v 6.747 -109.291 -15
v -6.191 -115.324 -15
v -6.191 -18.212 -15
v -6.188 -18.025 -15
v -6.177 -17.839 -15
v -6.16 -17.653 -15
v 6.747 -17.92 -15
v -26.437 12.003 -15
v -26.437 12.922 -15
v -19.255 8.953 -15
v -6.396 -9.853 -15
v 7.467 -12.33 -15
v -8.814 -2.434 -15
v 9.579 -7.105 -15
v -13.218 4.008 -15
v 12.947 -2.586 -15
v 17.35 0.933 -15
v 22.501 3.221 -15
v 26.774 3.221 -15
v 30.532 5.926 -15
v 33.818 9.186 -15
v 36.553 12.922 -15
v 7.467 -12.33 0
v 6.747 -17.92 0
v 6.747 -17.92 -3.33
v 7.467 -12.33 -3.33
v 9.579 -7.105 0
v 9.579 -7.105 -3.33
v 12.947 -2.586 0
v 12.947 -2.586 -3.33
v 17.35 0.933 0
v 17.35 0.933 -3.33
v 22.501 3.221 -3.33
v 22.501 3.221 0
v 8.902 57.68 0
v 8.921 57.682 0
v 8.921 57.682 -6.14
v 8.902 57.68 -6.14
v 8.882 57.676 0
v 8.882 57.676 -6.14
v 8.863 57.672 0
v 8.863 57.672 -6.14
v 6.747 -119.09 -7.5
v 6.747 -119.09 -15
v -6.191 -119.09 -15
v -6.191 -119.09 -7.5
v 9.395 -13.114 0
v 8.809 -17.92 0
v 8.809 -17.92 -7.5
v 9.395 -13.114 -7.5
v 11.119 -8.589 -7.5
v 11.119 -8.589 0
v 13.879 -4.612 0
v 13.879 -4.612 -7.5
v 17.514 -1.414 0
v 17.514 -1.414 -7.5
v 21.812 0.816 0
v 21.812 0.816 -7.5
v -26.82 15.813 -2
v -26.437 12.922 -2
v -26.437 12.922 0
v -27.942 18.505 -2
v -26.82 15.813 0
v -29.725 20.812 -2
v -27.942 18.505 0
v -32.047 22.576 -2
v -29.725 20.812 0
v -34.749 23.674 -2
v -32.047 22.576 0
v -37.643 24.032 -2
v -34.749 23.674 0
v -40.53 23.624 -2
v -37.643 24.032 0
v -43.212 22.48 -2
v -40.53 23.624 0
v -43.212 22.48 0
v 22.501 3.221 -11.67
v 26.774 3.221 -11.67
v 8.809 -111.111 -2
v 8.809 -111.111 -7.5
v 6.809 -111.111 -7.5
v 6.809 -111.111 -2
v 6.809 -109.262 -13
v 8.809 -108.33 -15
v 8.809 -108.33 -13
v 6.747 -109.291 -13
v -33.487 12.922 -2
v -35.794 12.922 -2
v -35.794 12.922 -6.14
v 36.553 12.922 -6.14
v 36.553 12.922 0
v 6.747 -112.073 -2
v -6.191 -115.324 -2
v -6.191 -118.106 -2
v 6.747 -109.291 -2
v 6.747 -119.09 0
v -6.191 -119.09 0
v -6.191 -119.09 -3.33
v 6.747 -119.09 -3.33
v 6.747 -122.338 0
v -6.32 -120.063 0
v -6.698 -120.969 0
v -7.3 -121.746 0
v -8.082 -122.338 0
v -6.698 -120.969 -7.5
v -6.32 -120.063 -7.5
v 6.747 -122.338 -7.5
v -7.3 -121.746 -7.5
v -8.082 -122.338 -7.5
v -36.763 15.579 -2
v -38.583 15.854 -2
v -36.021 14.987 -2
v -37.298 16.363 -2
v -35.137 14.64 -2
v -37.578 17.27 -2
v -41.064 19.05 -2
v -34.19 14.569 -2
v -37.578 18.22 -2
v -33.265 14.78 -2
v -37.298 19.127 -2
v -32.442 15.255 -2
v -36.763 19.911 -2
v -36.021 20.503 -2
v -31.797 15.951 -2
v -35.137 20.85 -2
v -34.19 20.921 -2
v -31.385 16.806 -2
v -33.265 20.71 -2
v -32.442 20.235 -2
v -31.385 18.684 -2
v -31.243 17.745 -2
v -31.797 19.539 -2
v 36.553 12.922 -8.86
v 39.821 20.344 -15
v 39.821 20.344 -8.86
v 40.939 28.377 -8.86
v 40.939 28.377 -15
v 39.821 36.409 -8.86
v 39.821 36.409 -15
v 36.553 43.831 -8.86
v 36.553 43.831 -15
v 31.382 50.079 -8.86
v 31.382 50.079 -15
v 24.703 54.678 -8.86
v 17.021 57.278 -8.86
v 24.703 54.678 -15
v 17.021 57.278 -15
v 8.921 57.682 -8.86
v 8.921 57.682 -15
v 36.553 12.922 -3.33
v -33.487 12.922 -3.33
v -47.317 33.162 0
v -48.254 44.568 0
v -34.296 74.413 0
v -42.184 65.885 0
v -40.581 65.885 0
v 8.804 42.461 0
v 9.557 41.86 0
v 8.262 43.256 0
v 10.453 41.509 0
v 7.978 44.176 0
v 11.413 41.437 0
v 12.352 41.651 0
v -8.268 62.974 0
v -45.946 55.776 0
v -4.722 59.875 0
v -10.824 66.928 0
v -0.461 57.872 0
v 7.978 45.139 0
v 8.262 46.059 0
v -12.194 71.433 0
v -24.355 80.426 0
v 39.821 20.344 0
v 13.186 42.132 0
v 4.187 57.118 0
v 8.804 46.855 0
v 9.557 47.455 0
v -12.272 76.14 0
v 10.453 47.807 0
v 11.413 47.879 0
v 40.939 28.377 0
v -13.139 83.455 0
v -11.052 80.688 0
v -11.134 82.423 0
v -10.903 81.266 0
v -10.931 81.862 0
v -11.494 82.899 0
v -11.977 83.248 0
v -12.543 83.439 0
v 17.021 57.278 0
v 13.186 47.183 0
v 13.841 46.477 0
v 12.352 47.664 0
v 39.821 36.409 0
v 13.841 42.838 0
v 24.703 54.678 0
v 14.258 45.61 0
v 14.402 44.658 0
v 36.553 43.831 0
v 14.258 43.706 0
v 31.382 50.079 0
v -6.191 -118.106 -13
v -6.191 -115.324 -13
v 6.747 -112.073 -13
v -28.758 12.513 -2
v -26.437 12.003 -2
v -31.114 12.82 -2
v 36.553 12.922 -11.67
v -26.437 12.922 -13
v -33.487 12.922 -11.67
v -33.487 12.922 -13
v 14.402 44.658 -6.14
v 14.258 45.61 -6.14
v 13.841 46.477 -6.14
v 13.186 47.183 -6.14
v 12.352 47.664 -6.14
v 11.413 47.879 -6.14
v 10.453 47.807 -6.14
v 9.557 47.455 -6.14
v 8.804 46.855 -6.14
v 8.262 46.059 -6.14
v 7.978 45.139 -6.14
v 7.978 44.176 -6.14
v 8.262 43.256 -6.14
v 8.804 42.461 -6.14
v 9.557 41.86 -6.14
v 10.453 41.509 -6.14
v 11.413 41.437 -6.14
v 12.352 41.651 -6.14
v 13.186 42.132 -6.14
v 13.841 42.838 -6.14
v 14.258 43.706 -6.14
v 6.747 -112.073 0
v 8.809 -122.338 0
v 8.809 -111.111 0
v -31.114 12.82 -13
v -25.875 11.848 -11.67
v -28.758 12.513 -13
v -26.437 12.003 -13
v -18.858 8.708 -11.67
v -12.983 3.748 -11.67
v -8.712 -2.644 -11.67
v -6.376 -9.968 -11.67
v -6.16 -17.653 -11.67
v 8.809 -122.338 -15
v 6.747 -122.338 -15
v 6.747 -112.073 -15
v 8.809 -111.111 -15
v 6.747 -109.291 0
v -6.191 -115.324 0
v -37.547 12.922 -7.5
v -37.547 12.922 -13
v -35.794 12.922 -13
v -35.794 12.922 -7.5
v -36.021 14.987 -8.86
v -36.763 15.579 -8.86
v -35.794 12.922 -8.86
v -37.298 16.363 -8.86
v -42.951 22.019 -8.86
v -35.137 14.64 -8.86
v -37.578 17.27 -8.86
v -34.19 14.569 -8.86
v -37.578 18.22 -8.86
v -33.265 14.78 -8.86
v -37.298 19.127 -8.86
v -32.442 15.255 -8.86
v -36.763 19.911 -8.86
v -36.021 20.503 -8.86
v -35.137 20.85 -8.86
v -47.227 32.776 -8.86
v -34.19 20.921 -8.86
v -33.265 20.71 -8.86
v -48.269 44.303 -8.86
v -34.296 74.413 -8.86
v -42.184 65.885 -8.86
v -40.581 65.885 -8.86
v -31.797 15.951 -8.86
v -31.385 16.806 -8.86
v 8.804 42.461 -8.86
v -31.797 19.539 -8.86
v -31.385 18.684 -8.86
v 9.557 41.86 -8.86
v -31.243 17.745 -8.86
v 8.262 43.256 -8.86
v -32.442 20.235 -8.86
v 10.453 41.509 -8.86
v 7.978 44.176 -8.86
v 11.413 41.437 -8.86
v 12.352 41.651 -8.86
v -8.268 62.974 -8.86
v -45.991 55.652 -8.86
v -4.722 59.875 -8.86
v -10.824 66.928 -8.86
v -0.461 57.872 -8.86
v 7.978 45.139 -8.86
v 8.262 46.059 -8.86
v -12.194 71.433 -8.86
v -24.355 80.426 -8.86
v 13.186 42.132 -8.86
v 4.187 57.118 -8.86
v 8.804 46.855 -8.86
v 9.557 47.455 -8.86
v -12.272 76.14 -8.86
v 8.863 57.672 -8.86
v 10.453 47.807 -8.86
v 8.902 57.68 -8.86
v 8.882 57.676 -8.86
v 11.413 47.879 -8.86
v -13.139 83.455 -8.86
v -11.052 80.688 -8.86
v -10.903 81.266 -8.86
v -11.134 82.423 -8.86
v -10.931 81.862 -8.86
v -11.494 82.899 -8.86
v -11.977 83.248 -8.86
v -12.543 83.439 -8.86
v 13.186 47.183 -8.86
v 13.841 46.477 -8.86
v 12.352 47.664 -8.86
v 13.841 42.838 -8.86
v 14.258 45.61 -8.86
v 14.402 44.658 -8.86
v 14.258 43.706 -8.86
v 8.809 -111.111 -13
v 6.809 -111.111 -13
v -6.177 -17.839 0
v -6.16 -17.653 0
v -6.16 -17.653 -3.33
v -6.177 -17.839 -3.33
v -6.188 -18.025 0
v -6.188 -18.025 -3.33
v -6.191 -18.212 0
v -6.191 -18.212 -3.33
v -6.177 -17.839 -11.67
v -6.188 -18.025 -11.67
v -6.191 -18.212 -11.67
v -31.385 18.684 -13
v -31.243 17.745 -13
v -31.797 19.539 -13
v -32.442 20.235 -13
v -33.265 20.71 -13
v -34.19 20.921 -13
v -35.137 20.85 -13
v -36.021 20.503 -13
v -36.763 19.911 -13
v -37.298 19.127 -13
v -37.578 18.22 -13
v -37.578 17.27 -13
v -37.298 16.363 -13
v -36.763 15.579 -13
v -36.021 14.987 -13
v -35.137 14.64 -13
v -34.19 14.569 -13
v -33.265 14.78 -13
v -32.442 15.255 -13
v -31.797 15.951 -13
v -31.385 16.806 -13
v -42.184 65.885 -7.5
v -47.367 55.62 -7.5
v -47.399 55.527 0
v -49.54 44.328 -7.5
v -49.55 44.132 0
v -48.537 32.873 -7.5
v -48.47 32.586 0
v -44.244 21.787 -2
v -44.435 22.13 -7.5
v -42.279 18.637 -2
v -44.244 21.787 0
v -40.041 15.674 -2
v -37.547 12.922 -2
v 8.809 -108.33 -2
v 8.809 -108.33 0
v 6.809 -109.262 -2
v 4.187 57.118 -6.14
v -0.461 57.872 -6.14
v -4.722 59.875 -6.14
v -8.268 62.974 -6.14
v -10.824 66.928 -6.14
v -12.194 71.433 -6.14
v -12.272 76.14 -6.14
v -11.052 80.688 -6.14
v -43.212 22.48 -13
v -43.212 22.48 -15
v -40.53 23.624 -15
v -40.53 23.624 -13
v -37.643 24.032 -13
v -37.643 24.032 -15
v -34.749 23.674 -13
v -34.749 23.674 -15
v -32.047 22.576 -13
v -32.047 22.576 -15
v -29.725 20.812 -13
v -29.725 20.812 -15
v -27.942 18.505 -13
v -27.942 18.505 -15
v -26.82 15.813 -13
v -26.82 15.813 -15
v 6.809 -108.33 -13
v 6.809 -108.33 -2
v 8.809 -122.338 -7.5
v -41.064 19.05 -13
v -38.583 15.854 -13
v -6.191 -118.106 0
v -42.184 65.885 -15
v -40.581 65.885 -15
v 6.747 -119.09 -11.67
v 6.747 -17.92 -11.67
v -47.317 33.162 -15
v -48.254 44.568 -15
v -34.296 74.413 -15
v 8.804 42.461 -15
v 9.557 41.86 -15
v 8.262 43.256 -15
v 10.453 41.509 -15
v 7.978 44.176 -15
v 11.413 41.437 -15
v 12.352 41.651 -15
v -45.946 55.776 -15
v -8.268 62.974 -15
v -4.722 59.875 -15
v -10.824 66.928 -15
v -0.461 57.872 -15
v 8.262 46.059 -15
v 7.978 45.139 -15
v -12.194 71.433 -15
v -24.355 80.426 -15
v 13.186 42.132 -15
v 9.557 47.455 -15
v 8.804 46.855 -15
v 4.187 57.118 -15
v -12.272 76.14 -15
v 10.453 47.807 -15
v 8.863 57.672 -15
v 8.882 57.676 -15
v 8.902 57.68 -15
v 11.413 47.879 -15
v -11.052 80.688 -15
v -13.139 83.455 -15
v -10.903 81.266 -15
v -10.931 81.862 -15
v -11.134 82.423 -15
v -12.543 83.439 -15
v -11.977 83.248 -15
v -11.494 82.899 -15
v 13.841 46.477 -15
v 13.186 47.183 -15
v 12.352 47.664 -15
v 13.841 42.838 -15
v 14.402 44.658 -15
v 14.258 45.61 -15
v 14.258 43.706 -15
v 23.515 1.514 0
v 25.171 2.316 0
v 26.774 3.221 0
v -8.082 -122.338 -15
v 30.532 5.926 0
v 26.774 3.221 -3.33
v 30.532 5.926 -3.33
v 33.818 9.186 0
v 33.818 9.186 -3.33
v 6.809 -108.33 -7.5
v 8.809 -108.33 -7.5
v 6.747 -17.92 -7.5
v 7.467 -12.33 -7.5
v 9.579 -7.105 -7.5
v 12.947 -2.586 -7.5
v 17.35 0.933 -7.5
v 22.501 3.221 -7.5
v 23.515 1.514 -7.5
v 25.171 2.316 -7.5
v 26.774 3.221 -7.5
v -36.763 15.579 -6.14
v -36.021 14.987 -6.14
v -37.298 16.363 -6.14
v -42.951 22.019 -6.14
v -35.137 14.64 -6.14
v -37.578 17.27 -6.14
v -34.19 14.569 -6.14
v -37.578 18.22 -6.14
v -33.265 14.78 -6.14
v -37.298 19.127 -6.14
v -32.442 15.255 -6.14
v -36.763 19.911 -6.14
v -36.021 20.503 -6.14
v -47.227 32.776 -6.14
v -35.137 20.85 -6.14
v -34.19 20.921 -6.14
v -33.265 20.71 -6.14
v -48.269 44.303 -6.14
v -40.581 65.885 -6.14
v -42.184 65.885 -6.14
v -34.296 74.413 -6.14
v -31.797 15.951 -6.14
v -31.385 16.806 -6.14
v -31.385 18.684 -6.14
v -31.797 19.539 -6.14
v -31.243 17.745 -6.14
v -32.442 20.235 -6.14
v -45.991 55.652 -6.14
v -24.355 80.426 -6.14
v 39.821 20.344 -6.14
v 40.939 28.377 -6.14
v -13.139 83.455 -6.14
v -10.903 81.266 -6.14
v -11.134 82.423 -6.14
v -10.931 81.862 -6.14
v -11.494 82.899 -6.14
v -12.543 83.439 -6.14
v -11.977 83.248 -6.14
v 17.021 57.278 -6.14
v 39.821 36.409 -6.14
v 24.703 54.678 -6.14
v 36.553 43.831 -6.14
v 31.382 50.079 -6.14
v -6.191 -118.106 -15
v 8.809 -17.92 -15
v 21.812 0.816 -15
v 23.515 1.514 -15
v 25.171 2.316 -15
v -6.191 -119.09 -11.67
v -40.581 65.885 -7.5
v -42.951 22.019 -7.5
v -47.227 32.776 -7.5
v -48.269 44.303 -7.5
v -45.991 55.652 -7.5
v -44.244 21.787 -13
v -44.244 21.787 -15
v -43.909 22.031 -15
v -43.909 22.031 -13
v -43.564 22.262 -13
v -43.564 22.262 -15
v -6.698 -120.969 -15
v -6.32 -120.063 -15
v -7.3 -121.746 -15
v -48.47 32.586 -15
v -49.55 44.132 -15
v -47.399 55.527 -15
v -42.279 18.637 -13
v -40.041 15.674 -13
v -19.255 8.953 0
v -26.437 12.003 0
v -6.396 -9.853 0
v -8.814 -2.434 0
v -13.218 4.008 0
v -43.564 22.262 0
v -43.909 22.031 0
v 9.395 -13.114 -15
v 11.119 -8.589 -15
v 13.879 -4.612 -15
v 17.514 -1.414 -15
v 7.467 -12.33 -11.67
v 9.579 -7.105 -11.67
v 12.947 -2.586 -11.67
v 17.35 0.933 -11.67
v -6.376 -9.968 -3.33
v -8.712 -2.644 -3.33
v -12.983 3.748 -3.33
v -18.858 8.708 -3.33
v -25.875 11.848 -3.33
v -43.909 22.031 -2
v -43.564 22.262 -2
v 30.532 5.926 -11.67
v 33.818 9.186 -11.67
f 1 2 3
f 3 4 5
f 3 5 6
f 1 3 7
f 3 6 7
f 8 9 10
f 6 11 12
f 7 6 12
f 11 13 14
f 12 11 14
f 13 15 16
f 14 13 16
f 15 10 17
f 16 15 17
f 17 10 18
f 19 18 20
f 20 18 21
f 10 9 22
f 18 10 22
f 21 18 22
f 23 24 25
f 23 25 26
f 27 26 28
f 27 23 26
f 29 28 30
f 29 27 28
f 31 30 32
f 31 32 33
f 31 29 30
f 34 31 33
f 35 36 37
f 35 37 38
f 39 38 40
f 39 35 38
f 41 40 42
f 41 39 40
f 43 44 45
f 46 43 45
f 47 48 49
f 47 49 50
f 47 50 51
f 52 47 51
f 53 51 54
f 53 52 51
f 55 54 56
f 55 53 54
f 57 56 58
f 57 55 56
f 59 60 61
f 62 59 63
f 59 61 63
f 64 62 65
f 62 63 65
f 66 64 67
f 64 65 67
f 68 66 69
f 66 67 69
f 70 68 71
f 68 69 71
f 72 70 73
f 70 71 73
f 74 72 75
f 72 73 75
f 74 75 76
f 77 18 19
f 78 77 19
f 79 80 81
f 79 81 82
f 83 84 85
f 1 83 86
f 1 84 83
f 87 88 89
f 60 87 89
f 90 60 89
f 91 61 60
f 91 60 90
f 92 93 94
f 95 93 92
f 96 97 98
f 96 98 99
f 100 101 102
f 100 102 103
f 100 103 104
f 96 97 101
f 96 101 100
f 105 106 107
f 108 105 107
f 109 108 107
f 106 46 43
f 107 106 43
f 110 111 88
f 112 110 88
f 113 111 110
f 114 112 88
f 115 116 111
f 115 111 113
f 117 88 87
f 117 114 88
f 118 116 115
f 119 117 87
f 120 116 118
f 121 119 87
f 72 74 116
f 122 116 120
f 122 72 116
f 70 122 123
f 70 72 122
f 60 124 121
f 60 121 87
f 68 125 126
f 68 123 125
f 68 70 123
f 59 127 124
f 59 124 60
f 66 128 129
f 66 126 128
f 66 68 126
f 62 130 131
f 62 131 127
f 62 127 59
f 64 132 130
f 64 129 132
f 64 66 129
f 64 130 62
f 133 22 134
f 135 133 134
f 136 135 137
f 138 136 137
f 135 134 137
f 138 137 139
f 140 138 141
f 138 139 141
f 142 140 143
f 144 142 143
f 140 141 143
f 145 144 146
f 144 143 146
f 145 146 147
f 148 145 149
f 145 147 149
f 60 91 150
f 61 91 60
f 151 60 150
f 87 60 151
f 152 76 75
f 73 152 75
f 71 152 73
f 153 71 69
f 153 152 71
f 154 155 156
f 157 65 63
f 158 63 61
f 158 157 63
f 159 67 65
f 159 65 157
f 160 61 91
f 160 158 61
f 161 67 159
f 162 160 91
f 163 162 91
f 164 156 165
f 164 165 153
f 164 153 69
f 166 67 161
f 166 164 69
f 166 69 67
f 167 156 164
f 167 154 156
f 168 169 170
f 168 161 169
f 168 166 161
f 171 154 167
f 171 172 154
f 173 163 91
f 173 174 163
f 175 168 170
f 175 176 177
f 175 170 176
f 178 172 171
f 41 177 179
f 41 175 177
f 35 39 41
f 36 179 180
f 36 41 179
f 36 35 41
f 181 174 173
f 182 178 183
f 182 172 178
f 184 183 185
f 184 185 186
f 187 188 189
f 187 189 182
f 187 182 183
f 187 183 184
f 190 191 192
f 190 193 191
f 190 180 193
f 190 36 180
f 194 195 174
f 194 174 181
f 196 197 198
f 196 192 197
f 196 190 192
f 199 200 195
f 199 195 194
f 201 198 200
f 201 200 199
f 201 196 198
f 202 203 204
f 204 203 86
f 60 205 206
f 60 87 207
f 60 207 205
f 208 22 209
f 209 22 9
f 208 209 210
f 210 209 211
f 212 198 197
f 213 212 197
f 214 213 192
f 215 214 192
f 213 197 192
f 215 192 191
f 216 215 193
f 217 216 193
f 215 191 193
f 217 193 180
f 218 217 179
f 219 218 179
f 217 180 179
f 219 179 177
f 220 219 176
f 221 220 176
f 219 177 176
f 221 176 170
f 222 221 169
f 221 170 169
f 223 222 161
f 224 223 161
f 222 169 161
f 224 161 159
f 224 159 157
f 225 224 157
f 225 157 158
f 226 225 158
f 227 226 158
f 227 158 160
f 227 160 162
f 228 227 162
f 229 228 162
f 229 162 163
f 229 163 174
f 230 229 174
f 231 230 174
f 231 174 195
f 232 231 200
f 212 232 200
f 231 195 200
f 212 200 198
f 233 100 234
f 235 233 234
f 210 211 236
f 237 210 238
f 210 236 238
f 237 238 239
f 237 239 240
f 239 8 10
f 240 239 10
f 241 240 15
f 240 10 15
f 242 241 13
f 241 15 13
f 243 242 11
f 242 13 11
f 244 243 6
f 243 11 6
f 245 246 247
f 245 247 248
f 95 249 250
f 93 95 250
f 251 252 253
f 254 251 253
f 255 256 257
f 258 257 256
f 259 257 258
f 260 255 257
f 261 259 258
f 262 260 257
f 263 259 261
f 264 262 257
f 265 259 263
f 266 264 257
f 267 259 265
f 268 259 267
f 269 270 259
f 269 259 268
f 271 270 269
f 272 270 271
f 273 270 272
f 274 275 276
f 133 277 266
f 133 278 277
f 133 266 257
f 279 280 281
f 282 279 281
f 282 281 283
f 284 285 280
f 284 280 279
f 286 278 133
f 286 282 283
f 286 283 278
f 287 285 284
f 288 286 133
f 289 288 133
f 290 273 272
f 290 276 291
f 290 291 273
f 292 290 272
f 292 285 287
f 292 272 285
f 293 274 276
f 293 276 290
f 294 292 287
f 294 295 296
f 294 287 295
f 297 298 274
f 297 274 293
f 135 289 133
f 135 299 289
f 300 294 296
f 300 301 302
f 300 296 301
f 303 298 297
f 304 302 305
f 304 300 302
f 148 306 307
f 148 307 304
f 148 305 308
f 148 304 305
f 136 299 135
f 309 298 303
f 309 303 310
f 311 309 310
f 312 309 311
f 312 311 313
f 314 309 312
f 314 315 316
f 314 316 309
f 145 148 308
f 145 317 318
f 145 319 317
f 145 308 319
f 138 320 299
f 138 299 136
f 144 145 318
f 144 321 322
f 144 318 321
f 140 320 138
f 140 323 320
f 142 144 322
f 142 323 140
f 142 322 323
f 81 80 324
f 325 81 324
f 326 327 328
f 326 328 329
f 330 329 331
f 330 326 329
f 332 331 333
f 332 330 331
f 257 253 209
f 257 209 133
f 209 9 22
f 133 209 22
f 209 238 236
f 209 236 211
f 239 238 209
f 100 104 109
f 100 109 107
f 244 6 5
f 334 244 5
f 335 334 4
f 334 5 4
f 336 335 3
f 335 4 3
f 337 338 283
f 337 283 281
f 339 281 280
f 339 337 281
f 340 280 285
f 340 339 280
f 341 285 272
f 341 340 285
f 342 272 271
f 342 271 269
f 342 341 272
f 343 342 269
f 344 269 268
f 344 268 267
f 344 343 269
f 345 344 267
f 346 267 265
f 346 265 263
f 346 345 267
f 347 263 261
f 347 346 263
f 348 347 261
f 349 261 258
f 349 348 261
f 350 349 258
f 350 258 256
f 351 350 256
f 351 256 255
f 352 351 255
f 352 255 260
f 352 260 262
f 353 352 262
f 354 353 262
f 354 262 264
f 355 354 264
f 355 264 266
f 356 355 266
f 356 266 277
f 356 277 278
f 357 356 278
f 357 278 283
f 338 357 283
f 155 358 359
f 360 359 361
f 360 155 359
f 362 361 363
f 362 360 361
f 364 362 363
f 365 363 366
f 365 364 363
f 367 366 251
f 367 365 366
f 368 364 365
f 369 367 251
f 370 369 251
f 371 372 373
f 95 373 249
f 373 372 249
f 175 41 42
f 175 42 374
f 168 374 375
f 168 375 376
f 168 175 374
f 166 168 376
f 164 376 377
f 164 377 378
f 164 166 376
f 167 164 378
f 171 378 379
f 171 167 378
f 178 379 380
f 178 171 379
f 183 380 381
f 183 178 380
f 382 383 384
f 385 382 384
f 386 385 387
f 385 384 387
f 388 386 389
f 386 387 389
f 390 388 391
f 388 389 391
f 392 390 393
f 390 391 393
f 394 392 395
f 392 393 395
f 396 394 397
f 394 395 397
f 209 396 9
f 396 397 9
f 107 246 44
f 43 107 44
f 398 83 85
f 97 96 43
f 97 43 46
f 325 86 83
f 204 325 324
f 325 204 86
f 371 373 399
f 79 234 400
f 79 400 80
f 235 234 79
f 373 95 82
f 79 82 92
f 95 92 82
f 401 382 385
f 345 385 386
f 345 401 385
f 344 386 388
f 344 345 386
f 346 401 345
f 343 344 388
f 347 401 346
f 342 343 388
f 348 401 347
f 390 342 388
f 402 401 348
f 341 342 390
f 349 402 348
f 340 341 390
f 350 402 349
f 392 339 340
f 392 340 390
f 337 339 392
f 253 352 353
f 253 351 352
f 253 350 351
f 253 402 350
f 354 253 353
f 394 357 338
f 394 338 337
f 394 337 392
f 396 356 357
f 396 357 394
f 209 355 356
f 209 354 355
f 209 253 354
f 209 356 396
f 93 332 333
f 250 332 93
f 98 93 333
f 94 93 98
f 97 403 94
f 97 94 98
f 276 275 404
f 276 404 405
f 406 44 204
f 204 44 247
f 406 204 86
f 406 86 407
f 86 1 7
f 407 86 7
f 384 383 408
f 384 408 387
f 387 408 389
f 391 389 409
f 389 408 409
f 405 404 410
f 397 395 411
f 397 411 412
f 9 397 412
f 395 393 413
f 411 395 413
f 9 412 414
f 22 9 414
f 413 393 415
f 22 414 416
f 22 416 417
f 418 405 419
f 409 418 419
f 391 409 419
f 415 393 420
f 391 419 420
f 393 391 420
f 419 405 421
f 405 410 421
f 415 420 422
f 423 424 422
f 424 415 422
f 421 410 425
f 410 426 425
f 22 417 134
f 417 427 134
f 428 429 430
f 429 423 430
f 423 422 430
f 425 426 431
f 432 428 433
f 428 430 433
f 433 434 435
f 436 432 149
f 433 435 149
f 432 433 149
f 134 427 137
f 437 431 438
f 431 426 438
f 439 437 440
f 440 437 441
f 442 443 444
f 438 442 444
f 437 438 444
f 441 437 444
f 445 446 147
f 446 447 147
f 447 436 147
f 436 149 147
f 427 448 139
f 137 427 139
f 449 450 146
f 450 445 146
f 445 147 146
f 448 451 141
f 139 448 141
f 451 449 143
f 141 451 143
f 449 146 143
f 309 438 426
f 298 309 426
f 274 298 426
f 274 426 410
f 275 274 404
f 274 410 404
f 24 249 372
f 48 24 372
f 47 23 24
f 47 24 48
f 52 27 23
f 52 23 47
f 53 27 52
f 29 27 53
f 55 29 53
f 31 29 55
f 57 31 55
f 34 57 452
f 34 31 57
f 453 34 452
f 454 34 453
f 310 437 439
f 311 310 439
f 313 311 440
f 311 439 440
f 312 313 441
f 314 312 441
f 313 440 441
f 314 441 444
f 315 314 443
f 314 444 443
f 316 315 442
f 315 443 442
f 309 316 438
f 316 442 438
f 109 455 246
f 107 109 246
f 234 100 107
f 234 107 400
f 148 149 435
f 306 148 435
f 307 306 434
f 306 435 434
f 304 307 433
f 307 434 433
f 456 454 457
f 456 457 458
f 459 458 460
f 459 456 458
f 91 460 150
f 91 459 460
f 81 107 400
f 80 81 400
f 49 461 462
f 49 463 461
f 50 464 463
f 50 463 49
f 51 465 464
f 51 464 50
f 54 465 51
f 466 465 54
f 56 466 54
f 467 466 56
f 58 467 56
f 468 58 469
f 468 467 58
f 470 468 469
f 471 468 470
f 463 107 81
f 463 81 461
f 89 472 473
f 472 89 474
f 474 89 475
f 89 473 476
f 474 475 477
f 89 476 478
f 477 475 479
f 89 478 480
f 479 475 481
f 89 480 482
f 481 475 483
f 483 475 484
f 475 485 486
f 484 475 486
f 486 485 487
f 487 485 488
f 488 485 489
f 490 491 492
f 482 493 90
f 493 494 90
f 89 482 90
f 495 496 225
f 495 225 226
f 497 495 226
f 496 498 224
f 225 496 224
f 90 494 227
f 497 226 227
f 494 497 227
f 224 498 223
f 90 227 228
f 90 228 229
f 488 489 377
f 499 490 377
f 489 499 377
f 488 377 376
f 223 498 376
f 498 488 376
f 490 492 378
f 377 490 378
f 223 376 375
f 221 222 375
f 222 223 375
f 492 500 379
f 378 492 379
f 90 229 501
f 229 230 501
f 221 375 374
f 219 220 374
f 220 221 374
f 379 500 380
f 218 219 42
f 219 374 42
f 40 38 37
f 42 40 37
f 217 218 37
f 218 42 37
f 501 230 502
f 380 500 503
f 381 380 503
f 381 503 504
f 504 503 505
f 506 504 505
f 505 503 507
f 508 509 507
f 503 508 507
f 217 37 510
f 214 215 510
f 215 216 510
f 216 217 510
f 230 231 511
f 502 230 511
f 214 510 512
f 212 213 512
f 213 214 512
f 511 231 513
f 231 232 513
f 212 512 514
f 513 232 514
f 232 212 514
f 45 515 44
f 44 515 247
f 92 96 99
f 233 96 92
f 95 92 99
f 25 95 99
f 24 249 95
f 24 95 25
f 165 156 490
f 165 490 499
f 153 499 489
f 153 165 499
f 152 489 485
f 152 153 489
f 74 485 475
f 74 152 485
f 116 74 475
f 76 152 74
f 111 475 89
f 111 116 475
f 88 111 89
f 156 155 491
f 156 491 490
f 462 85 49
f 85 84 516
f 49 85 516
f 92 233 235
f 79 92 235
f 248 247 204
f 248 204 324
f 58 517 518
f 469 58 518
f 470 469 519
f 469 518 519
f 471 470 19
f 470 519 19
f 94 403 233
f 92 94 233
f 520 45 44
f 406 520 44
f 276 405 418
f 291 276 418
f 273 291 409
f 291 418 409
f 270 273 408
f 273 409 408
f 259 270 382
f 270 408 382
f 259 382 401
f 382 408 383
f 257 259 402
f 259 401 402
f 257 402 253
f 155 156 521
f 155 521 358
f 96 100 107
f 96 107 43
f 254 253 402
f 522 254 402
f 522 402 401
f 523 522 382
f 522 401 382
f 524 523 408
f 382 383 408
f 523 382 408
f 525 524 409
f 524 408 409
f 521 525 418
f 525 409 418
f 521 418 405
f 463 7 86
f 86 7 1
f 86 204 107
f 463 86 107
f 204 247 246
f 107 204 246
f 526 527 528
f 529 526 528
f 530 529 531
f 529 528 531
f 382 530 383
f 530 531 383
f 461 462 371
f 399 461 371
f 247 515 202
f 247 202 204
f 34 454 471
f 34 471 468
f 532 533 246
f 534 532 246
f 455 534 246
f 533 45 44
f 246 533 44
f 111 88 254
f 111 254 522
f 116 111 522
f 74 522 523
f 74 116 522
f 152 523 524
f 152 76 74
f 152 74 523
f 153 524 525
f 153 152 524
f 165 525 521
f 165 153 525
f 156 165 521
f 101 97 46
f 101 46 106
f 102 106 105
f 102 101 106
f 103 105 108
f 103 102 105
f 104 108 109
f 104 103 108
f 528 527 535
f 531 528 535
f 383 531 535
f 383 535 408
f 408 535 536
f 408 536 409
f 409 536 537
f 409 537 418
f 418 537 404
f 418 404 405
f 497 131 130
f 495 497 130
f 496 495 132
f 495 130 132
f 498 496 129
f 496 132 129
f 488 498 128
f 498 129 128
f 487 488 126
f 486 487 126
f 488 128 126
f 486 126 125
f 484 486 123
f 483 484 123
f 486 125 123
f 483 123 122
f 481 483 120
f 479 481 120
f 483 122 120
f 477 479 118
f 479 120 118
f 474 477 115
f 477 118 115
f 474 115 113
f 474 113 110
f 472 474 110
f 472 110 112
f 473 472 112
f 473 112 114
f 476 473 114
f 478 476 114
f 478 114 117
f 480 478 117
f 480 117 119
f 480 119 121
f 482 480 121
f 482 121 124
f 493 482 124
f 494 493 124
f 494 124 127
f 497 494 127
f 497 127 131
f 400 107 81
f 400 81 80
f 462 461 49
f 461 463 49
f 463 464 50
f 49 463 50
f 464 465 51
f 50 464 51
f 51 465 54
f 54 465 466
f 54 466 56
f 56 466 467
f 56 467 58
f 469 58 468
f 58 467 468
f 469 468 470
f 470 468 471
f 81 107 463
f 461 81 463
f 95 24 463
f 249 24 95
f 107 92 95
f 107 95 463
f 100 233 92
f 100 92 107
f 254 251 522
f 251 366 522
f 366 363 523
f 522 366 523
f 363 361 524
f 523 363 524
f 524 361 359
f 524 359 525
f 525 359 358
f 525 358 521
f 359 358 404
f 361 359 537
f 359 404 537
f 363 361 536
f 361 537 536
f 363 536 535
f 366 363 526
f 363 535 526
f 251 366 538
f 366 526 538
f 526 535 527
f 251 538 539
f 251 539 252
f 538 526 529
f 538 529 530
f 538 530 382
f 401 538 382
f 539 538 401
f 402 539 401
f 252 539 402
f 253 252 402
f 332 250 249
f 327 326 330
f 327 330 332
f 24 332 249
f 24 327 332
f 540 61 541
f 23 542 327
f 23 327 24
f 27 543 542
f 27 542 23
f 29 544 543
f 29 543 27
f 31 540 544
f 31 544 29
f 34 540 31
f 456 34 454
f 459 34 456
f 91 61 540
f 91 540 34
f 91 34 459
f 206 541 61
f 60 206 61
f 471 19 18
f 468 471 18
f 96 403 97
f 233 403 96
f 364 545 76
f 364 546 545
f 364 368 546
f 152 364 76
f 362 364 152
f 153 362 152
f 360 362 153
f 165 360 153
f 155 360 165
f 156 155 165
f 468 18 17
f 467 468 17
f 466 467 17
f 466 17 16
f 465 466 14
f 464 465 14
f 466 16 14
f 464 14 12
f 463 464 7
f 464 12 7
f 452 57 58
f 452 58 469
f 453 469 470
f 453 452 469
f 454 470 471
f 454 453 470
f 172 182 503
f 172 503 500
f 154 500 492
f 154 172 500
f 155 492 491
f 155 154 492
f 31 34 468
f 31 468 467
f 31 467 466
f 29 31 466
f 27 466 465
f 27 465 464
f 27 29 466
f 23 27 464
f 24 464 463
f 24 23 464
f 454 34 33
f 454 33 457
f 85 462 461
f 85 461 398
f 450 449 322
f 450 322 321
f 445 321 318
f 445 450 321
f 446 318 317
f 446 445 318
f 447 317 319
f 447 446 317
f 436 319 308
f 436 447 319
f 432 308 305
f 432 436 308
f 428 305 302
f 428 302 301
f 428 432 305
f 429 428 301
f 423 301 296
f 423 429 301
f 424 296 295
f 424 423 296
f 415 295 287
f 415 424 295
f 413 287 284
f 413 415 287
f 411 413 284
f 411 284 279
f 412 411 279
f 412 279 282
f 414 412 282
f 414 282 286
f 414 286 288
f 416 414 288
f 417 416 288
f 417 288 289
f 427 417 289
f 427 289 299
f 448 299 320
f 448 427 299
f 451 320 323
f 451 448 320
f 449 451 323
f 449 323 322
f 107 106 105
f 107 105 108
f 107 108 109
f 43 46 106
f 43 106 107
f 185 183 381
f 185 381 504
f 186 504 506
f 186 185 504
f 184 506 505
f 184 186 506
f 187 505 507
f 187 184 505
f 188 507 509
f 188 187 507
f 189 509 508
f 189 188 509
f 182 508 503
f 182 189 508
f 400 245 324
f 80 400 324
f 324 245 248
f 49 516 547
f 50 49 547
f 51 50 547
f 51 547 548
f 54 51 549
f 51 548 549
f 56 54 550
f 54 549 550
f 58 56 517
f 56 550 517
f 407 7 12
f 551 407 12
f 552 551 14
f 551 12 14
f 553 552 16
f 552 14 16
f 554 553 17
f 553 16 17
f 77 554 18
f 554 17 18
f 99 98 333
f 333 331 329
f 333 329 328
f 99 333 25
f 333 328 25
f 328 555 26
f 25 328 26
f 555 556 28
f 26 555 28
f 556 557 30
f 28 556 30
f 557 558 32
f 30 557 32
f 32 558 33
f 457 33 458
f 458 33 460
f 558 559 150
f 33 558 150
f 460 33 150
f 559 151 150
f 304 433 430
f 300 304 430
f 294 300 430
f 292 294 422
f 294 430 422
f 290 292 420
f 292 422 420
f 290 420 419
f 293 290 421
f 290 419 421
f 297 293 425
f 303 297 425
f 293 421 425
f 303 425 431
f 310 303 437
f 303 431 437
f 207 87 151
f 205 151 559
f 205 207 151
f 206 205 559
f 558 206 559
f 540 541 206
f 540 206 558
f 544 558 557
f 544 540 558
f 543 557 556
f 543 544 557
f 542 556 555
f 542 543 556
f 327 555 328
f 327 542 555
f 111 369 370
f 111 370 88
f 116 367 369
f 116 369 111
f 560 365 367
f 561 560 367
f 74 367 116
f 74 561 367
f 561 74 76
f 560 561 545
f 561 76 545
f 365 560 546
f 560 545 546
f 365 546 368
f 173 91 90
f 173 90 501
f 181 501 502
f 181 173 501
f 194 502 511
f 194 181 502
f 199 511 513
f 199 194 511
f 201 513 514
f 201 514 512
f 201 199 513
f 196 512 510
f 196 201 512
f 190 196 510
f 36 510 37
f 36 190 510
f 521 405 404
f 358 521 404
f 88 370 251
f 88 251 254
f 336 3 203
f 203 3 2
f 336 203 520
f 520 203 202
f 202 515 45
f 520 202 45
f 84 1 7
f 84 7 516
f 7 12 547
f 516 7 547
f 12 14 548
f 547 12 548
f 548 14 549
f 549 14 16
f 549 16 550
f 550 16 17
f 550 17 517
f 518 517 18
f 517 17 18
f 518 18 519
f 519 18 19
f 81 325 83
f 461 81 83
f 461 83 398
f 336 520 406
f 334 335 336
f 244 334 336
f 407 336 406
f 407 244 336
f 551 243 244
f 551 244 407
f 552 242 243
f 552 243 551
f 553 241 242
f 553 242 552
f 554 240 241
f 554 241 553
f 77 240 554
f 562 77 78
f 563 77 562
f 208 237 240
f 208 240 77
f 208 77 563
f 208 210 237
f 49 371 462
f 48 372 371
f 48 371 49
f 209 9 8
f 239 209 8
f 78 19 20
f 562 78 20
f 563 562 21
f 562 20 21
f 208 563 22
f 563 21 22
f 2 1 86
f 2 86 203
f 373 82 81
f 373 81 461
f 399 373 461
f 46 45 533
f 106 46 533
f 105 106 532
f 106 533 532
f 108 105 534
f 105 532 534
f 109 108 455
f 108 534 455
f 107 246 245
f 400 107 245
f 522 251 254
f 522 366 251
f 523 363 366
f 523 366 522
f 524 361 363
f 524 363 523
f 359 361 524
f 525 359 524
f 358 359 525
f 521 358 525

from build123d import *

# Parameters (mm, degrees)
F1_DEPTH  = 7.5
F2_DEPTH  = 7.5
F3_DEPTH  = 3.33
F0_R      = 3.185
F0_R_2    = 3.23
F4_DEPTH  = 6.14
F5_DEPTH  = 7.5
F8_DEPTH  = 2
F9_W      = 2.7816444635
F9_H      = 5.5
F10_DEPTH = 2
F14_DEPTH = 2
F17_DEPTH = 2


with BuildPart() as f1:
    # F0 (on Top) → F1 (new body)
    with BuildSketch(Plane.XY):
        with BuildLine():
            Line((8.8088196781, -59.1273443937), (8.8088196781, -17.9198504258))
            ThreePointArc((8.8088196781, -17.9198504258), (12.3780078725, -6.516849794), (21.811662019, 0.8162053142))
            ThreePointArc((21.811662019, 0.8162053142), (24.3493437167, 1.9021505043), (26.7740816538, 3.2211468239))
            Line((26.7740816538, 3.2211468239), (22.5007778988, 3.2211468239))
            ThreePointArc((22.5007778988, 3.2211468239), (11.1184075705, -4.7371922999), (6.7467899482, -17.9198504258))
            Line((6.7467899482, -17.9198504258), (6.7467899482, -59.1273443937))
            Line((6.7467899482, -59.1273443937), (6.7467899482, -119.0898504258))
            Line((6.7467899482, -119.0898504258), (6.7467899482, -122.3384766844))
            Line((6.7467899482, -122.3384766844), (8.8088196781, -122.3384766844))
            Line((8.8088196781, -122.3384766844), (8.8088196781, -59.1273443937))
        make_face()
    extrude(amount=-F1_DEPTH)


with BuildPart() as f2:
    # F0 (on Top) → F2 (new body)
    with BuildSketch(Plane.XY):
        with BuildLine():
            Line((-8.0824800033, -122.3384766844), (6.7467899482, -122.3384766844))
            Line((6.7467899482, -122.3384766844), (6.7467899482, -119.0898504258))
            Line((6.7467899482, -119.0898504258), (-6.1911803219, -119.0898504258))
            ThreePointArc((-6.1911803219, -119.0898504258), (-6.6984458535, -120.9693840816), (-8.0824800033, -122.3384766844))
        make_face()
    extrude(amount=-F2_DEPTH)


with BuildPart() as f3:
    # F0 (on Top) → F3 (new body)
    with BuildSketch(Plane.XY):
        with BuildLine():
            Line((22.5007778988, 3.2211468239), (26.7740816538, 3.2211468239))
            ThreePointArc((26.7740816538, 3.2211468239), (32.2391411967, 7.4914065207), (36.5526747632, 12.9223752977))
            Line((36.5526747632, 12.9223752977), (-33.4873252368, 12.9223752977))
            ThreePointArc((-33.4873252368, 12.9223752977), (-12.9834206648, 3.748310398), (-6.1598180011, -17.6529048985))
            ThreePointArc((-6.1598180011, -17.6529048985), (-6.1833335846, -17.9320363919), (-6.1911803219, -18.2120467524))
            Line((-6.1911803219, -18.2120467524), (-6.1911803219, -119.0898504258))
            Line((-6.1911803219, -119.0898504258), (6.7467899482, -119.0898504258))
            Line((6.7467899482, -119.0898504258), (6.7467899482, -59.1273443937))
            Line((6.7467899482, -59.1273443937), (6.7467899482, -17.9198504258))
            ThreePointArc((6.7467899482, -17.9198504258), (11.1184075705, -4.7371922999), (22.5007778988, 3.2211468239))
        make_face()
    extrude(amount=-F3_DEPTH)


with BuildPart() as f4:
    # F0 (on Top) → F4 (new body)
    with BuildSketch(Plane.XY):
        with BuildLine():
            Line((-33.4873252368, 12.9223752977), (36.5526747632, 12.9223752977))
            ThreePointArc((36.5526747632, 12.9223752977), (36.5529133557, 43.8311248311), (8.9213631661, 57.6820537492))
            ThreePointArc((8.9213631661, 57.6820537492), (8.8919123245, 57.6781849796), (8.8628925916, 57.6718466396))
            ThreePointArc((8.8628925916, 57.6718466396), (-8.2675679301, 62.9735147852), (-11.0515846019, 80.688187065))
            ThreePointArc((-11.0515846019, 80.688187065), (-11.2960308683, 82.6744411626), (-13.1389592812, 83.4545528098))
            ThreePointArc((-13.1389592812, 83.4545528098), (-29.5363204866, 77.7688440903), (-42.1843247147, 65.8848747538))
            Line((-42.1843247147, 65.8848747538), (-40.5813219482, 65.8848747538))
            ThreePointArc((-40.5813219482, 65.8848747538), (-48.1638587582, 38.5018882849), (-35.7940839918, 12.9223752977))
            Line((-35.7940839918, 12.9223752977), (-33.4873252368, 12.9223752977))
        make_face()
        with Locations((-34.428260039, 17.7449777678)):
            Circle(F0_R, mode=Mode.SUBTRACT)
        with Locations((11.1718727276, 44.6576625109)):
            Circle(F0_R_2, mode=Mode.SUBTRACT)
    extrude(amount=-F4_DEPTH)


with BuildPart() as f5:
    # F0 (on Top) → F5 (new body)
    with BuildSketch(Plane.XY):
        with BuildLine():
            Line((-37.5471541768, 12.9223752977), (-35.7940839918, 12.9223752977))
            ThreePointArc((-35.7940839918, 12.9223752977), (-48.1638587582, 38.5018882849), (-40.5813219482, 65.8848747538))
            Line((-40.5813219482, 65.8848747538), (-42.1843247147, 65.8848747538))
            ThreePointArc((-42.1843247147, 65.8848747538), (-49.436528488, 38.5656475619), (-37.5471541768, 12.9223752977))
        make_face()
    extrude(amount=-F5_DEPTH)


with BuildPart() as f8_tool:
    # F7 (on face) → F8 (new body)
    with BuildSketch(Plane.XY):
        Polygon((-6.1911803219, -115.3242123343), (-6.1911803219, -118.1058567978), (6.7467899482, -112.0727821798), (6.7467899482, -109.2911377163), align=None)
        Polygon((6.7467899482, -109.2911377163), (6.7467899482, -112.0727821798), (8.8088196781, -111.1112419255), (8.8088196781, -108.3295974619), align=None)
    extrude(amount=-F8_DEPTH)


with BuildPart() as f1_1:
    add(f1.part)

    # F8: cut by f8_tool
    add(f8_tool.part, mode=Mode.SUBTRACT)

    # F9 (on face) → F10 (cut)
    with BuildSketch(Plane.YZ.offset(8.8088196781)):
        with Locations((-109.7204196937, -4.75)):
            Rectangle(F9_W, F9_H)
    extrude(amount=-F10_DEPTH, mode=Mode.SUBTRACT)


with BuildPart() as f3_1:
    add(f3.part)

    # F8: cut by f8_tool
    add(f8_tool.part, mode=Mode.SUBTRACT)


with BuildPart() as f11_1:
    # F11: instance of F4
    add(f4.part.mirror(Plane(origin=(9.0970071096, -56.098686688, -7.5), x_dir=(1, 0, 0), z_dir=(0, 0, -1))))


with BuildPart() as f11_2:
    # F11: instance of F3
    add(f3_1.part.mirror(Plane(origin=(9.0970071096, -56.098686688, -7.5), x_dir=(1, 0, 0), z_dir=(0, 0, -1))))


with BuildPart() as f11_3:
    # F11: instance of F1
    add(f1_1.part.mirror(Plane(origin=(9.0970071096, -56.098686688, -7.5), x_dir=(1, 0, 0), z_dir=(0, 0, -1))))


with BuildPart() as f11_4:
    # F11: instance of F5
    add(f5.part.mirror(Plane(origin=(9.0970071096, -56.098686688, -7.5), x_dir=(1, 0, 0), z_dir=(0, 0, -1))))


with BuildPart() as f11_5:
    # F11: instance of F2
    add(f2.part.mirror(Plane(origin=(9.0970071096, -56.098686688, -7.5), x_dir=(1, 0, 0), z_dir=(0, 0, -1))))


with BuildPart() as f14_tool:
    # F13 (on offset) → F14 (new body)
    with BuildSketch(Plane.XY):
        with BuildLine():
            ThreePointArc((-26.437154177, 12.9223752977), (-32.5957619895, 22.868018334), (-44.2437816128, 21.7873220536))
            ThreePointArc((-44.2437816128, 21.7873220536), (-41.1928919207, 17.1301730012), (-37.5471541769, 12.9223752978))
            Line((-37.547154177, 12.9223752977), (-35.7940839918, 12.9223752977))
            Line((-35.7940839918, 12.9223752977), (-33.4873252368, 12.9223752977))
            Line((-33.4873252368, 12.9223752977), (-26.437154177, 12.9223752977))
        make_face()
        with BuildLine():
            Line((-26.437154177, 12.003291159), (-26.437154177, 12.9223752977))
            Line((-26.437154177, 12.9223752977), (-33.4873252368, 12.9223752977))
            ThreePointArc((-33.4873252368, 12.9223752977), (-29.9324121708, 12.6916362538), (-26.437154177, 12.003291159))
        make_face()
    extrude(amount=-F14_DEPTH)


with BuildPart() as f3_2:
    add(f3_1.part)

    # F14: cut by f14_tool
    add(f14_tool.part, mode=Mode.SUBTRACT)


with BuildPart() as f4_1:
    add(f4.part)

    # F14: cut by f14_tool
    add(f14_tool.part, mode=Mode.SUBTRACT)


with BuildPart() as f5_1:
    add(f5.part)

    # F14: cut by f14_tool
    add(f14_tool.part, mode=Mode.SUBTRACT)


with BuildPart() as f17_tool:
    # F16 (on offset) → F17 (new body)
    with BuildSketch(Plane(origin=(0, 0, -15), x_dir=(1, 0, 0), z_dir=(0, 0, -1))):
        with BuildLine():
            ThreePointArc((-26.4371541768, -12.003291159), (-29.9324121707, -12.6916362538), (-33.4873252368, -12.9223752977))
            Line((-33.4873252368, -12.9223752977), (-26.4371541768, -12.9223752977))
            Line((-26.4371541768, -12.9223752977), (-26.4371541768, -12.003291159))
        make_face()
        with BuildLine():
            Line((-33.4873252368, -12.9223752977), (-35.7940839918, -12.9223752977))
            Line((-35.7940839918, -12.9223752977), (-37.5471541768, -12.9223752977))
            ThreePointArc((-37.5471541768, -12.9223752977), (-41.1928919206, -17.1301730011), (-44.2437816127, -21.7873220535))
            ThreePointArc((-44.2437816127, -21.7873220535), (-32.5957619894, -22.8680183341), (-26.4371541768, -12.9223752977))
            Line((-26.4371541768, -12.9223752977), (-33.4873252368, -12.9223752977))
        make_face()
    extrude(amount=-F17_DEPTH)


with BuildPart() as f11_1_1:
    add(f11_1.part)

    # F17: cut by f17_tool
    add(f17_tool.part, mode=Mode.SUBTRACT)


with BuildPart() as f11_2_1:
    add(f11_2.part)

    # F17: cut by f17_tool
    add(f17_tool.part, mode=Mode.SUBTRACT)


with BuildPart() as f11_4_1:
    add(f11_4.part)

    # F17: cut by f17_tool
    add(f17_tool.part, mode=Mode.SUBTRACT)


solid = Compound([f2.part, f1_1.part, f11_3.part, f11_5.part, f3_2.part, f4_1.part, f5_1.part, f11_1_1.part, f11_2_1.part, f11_4_1.part])
